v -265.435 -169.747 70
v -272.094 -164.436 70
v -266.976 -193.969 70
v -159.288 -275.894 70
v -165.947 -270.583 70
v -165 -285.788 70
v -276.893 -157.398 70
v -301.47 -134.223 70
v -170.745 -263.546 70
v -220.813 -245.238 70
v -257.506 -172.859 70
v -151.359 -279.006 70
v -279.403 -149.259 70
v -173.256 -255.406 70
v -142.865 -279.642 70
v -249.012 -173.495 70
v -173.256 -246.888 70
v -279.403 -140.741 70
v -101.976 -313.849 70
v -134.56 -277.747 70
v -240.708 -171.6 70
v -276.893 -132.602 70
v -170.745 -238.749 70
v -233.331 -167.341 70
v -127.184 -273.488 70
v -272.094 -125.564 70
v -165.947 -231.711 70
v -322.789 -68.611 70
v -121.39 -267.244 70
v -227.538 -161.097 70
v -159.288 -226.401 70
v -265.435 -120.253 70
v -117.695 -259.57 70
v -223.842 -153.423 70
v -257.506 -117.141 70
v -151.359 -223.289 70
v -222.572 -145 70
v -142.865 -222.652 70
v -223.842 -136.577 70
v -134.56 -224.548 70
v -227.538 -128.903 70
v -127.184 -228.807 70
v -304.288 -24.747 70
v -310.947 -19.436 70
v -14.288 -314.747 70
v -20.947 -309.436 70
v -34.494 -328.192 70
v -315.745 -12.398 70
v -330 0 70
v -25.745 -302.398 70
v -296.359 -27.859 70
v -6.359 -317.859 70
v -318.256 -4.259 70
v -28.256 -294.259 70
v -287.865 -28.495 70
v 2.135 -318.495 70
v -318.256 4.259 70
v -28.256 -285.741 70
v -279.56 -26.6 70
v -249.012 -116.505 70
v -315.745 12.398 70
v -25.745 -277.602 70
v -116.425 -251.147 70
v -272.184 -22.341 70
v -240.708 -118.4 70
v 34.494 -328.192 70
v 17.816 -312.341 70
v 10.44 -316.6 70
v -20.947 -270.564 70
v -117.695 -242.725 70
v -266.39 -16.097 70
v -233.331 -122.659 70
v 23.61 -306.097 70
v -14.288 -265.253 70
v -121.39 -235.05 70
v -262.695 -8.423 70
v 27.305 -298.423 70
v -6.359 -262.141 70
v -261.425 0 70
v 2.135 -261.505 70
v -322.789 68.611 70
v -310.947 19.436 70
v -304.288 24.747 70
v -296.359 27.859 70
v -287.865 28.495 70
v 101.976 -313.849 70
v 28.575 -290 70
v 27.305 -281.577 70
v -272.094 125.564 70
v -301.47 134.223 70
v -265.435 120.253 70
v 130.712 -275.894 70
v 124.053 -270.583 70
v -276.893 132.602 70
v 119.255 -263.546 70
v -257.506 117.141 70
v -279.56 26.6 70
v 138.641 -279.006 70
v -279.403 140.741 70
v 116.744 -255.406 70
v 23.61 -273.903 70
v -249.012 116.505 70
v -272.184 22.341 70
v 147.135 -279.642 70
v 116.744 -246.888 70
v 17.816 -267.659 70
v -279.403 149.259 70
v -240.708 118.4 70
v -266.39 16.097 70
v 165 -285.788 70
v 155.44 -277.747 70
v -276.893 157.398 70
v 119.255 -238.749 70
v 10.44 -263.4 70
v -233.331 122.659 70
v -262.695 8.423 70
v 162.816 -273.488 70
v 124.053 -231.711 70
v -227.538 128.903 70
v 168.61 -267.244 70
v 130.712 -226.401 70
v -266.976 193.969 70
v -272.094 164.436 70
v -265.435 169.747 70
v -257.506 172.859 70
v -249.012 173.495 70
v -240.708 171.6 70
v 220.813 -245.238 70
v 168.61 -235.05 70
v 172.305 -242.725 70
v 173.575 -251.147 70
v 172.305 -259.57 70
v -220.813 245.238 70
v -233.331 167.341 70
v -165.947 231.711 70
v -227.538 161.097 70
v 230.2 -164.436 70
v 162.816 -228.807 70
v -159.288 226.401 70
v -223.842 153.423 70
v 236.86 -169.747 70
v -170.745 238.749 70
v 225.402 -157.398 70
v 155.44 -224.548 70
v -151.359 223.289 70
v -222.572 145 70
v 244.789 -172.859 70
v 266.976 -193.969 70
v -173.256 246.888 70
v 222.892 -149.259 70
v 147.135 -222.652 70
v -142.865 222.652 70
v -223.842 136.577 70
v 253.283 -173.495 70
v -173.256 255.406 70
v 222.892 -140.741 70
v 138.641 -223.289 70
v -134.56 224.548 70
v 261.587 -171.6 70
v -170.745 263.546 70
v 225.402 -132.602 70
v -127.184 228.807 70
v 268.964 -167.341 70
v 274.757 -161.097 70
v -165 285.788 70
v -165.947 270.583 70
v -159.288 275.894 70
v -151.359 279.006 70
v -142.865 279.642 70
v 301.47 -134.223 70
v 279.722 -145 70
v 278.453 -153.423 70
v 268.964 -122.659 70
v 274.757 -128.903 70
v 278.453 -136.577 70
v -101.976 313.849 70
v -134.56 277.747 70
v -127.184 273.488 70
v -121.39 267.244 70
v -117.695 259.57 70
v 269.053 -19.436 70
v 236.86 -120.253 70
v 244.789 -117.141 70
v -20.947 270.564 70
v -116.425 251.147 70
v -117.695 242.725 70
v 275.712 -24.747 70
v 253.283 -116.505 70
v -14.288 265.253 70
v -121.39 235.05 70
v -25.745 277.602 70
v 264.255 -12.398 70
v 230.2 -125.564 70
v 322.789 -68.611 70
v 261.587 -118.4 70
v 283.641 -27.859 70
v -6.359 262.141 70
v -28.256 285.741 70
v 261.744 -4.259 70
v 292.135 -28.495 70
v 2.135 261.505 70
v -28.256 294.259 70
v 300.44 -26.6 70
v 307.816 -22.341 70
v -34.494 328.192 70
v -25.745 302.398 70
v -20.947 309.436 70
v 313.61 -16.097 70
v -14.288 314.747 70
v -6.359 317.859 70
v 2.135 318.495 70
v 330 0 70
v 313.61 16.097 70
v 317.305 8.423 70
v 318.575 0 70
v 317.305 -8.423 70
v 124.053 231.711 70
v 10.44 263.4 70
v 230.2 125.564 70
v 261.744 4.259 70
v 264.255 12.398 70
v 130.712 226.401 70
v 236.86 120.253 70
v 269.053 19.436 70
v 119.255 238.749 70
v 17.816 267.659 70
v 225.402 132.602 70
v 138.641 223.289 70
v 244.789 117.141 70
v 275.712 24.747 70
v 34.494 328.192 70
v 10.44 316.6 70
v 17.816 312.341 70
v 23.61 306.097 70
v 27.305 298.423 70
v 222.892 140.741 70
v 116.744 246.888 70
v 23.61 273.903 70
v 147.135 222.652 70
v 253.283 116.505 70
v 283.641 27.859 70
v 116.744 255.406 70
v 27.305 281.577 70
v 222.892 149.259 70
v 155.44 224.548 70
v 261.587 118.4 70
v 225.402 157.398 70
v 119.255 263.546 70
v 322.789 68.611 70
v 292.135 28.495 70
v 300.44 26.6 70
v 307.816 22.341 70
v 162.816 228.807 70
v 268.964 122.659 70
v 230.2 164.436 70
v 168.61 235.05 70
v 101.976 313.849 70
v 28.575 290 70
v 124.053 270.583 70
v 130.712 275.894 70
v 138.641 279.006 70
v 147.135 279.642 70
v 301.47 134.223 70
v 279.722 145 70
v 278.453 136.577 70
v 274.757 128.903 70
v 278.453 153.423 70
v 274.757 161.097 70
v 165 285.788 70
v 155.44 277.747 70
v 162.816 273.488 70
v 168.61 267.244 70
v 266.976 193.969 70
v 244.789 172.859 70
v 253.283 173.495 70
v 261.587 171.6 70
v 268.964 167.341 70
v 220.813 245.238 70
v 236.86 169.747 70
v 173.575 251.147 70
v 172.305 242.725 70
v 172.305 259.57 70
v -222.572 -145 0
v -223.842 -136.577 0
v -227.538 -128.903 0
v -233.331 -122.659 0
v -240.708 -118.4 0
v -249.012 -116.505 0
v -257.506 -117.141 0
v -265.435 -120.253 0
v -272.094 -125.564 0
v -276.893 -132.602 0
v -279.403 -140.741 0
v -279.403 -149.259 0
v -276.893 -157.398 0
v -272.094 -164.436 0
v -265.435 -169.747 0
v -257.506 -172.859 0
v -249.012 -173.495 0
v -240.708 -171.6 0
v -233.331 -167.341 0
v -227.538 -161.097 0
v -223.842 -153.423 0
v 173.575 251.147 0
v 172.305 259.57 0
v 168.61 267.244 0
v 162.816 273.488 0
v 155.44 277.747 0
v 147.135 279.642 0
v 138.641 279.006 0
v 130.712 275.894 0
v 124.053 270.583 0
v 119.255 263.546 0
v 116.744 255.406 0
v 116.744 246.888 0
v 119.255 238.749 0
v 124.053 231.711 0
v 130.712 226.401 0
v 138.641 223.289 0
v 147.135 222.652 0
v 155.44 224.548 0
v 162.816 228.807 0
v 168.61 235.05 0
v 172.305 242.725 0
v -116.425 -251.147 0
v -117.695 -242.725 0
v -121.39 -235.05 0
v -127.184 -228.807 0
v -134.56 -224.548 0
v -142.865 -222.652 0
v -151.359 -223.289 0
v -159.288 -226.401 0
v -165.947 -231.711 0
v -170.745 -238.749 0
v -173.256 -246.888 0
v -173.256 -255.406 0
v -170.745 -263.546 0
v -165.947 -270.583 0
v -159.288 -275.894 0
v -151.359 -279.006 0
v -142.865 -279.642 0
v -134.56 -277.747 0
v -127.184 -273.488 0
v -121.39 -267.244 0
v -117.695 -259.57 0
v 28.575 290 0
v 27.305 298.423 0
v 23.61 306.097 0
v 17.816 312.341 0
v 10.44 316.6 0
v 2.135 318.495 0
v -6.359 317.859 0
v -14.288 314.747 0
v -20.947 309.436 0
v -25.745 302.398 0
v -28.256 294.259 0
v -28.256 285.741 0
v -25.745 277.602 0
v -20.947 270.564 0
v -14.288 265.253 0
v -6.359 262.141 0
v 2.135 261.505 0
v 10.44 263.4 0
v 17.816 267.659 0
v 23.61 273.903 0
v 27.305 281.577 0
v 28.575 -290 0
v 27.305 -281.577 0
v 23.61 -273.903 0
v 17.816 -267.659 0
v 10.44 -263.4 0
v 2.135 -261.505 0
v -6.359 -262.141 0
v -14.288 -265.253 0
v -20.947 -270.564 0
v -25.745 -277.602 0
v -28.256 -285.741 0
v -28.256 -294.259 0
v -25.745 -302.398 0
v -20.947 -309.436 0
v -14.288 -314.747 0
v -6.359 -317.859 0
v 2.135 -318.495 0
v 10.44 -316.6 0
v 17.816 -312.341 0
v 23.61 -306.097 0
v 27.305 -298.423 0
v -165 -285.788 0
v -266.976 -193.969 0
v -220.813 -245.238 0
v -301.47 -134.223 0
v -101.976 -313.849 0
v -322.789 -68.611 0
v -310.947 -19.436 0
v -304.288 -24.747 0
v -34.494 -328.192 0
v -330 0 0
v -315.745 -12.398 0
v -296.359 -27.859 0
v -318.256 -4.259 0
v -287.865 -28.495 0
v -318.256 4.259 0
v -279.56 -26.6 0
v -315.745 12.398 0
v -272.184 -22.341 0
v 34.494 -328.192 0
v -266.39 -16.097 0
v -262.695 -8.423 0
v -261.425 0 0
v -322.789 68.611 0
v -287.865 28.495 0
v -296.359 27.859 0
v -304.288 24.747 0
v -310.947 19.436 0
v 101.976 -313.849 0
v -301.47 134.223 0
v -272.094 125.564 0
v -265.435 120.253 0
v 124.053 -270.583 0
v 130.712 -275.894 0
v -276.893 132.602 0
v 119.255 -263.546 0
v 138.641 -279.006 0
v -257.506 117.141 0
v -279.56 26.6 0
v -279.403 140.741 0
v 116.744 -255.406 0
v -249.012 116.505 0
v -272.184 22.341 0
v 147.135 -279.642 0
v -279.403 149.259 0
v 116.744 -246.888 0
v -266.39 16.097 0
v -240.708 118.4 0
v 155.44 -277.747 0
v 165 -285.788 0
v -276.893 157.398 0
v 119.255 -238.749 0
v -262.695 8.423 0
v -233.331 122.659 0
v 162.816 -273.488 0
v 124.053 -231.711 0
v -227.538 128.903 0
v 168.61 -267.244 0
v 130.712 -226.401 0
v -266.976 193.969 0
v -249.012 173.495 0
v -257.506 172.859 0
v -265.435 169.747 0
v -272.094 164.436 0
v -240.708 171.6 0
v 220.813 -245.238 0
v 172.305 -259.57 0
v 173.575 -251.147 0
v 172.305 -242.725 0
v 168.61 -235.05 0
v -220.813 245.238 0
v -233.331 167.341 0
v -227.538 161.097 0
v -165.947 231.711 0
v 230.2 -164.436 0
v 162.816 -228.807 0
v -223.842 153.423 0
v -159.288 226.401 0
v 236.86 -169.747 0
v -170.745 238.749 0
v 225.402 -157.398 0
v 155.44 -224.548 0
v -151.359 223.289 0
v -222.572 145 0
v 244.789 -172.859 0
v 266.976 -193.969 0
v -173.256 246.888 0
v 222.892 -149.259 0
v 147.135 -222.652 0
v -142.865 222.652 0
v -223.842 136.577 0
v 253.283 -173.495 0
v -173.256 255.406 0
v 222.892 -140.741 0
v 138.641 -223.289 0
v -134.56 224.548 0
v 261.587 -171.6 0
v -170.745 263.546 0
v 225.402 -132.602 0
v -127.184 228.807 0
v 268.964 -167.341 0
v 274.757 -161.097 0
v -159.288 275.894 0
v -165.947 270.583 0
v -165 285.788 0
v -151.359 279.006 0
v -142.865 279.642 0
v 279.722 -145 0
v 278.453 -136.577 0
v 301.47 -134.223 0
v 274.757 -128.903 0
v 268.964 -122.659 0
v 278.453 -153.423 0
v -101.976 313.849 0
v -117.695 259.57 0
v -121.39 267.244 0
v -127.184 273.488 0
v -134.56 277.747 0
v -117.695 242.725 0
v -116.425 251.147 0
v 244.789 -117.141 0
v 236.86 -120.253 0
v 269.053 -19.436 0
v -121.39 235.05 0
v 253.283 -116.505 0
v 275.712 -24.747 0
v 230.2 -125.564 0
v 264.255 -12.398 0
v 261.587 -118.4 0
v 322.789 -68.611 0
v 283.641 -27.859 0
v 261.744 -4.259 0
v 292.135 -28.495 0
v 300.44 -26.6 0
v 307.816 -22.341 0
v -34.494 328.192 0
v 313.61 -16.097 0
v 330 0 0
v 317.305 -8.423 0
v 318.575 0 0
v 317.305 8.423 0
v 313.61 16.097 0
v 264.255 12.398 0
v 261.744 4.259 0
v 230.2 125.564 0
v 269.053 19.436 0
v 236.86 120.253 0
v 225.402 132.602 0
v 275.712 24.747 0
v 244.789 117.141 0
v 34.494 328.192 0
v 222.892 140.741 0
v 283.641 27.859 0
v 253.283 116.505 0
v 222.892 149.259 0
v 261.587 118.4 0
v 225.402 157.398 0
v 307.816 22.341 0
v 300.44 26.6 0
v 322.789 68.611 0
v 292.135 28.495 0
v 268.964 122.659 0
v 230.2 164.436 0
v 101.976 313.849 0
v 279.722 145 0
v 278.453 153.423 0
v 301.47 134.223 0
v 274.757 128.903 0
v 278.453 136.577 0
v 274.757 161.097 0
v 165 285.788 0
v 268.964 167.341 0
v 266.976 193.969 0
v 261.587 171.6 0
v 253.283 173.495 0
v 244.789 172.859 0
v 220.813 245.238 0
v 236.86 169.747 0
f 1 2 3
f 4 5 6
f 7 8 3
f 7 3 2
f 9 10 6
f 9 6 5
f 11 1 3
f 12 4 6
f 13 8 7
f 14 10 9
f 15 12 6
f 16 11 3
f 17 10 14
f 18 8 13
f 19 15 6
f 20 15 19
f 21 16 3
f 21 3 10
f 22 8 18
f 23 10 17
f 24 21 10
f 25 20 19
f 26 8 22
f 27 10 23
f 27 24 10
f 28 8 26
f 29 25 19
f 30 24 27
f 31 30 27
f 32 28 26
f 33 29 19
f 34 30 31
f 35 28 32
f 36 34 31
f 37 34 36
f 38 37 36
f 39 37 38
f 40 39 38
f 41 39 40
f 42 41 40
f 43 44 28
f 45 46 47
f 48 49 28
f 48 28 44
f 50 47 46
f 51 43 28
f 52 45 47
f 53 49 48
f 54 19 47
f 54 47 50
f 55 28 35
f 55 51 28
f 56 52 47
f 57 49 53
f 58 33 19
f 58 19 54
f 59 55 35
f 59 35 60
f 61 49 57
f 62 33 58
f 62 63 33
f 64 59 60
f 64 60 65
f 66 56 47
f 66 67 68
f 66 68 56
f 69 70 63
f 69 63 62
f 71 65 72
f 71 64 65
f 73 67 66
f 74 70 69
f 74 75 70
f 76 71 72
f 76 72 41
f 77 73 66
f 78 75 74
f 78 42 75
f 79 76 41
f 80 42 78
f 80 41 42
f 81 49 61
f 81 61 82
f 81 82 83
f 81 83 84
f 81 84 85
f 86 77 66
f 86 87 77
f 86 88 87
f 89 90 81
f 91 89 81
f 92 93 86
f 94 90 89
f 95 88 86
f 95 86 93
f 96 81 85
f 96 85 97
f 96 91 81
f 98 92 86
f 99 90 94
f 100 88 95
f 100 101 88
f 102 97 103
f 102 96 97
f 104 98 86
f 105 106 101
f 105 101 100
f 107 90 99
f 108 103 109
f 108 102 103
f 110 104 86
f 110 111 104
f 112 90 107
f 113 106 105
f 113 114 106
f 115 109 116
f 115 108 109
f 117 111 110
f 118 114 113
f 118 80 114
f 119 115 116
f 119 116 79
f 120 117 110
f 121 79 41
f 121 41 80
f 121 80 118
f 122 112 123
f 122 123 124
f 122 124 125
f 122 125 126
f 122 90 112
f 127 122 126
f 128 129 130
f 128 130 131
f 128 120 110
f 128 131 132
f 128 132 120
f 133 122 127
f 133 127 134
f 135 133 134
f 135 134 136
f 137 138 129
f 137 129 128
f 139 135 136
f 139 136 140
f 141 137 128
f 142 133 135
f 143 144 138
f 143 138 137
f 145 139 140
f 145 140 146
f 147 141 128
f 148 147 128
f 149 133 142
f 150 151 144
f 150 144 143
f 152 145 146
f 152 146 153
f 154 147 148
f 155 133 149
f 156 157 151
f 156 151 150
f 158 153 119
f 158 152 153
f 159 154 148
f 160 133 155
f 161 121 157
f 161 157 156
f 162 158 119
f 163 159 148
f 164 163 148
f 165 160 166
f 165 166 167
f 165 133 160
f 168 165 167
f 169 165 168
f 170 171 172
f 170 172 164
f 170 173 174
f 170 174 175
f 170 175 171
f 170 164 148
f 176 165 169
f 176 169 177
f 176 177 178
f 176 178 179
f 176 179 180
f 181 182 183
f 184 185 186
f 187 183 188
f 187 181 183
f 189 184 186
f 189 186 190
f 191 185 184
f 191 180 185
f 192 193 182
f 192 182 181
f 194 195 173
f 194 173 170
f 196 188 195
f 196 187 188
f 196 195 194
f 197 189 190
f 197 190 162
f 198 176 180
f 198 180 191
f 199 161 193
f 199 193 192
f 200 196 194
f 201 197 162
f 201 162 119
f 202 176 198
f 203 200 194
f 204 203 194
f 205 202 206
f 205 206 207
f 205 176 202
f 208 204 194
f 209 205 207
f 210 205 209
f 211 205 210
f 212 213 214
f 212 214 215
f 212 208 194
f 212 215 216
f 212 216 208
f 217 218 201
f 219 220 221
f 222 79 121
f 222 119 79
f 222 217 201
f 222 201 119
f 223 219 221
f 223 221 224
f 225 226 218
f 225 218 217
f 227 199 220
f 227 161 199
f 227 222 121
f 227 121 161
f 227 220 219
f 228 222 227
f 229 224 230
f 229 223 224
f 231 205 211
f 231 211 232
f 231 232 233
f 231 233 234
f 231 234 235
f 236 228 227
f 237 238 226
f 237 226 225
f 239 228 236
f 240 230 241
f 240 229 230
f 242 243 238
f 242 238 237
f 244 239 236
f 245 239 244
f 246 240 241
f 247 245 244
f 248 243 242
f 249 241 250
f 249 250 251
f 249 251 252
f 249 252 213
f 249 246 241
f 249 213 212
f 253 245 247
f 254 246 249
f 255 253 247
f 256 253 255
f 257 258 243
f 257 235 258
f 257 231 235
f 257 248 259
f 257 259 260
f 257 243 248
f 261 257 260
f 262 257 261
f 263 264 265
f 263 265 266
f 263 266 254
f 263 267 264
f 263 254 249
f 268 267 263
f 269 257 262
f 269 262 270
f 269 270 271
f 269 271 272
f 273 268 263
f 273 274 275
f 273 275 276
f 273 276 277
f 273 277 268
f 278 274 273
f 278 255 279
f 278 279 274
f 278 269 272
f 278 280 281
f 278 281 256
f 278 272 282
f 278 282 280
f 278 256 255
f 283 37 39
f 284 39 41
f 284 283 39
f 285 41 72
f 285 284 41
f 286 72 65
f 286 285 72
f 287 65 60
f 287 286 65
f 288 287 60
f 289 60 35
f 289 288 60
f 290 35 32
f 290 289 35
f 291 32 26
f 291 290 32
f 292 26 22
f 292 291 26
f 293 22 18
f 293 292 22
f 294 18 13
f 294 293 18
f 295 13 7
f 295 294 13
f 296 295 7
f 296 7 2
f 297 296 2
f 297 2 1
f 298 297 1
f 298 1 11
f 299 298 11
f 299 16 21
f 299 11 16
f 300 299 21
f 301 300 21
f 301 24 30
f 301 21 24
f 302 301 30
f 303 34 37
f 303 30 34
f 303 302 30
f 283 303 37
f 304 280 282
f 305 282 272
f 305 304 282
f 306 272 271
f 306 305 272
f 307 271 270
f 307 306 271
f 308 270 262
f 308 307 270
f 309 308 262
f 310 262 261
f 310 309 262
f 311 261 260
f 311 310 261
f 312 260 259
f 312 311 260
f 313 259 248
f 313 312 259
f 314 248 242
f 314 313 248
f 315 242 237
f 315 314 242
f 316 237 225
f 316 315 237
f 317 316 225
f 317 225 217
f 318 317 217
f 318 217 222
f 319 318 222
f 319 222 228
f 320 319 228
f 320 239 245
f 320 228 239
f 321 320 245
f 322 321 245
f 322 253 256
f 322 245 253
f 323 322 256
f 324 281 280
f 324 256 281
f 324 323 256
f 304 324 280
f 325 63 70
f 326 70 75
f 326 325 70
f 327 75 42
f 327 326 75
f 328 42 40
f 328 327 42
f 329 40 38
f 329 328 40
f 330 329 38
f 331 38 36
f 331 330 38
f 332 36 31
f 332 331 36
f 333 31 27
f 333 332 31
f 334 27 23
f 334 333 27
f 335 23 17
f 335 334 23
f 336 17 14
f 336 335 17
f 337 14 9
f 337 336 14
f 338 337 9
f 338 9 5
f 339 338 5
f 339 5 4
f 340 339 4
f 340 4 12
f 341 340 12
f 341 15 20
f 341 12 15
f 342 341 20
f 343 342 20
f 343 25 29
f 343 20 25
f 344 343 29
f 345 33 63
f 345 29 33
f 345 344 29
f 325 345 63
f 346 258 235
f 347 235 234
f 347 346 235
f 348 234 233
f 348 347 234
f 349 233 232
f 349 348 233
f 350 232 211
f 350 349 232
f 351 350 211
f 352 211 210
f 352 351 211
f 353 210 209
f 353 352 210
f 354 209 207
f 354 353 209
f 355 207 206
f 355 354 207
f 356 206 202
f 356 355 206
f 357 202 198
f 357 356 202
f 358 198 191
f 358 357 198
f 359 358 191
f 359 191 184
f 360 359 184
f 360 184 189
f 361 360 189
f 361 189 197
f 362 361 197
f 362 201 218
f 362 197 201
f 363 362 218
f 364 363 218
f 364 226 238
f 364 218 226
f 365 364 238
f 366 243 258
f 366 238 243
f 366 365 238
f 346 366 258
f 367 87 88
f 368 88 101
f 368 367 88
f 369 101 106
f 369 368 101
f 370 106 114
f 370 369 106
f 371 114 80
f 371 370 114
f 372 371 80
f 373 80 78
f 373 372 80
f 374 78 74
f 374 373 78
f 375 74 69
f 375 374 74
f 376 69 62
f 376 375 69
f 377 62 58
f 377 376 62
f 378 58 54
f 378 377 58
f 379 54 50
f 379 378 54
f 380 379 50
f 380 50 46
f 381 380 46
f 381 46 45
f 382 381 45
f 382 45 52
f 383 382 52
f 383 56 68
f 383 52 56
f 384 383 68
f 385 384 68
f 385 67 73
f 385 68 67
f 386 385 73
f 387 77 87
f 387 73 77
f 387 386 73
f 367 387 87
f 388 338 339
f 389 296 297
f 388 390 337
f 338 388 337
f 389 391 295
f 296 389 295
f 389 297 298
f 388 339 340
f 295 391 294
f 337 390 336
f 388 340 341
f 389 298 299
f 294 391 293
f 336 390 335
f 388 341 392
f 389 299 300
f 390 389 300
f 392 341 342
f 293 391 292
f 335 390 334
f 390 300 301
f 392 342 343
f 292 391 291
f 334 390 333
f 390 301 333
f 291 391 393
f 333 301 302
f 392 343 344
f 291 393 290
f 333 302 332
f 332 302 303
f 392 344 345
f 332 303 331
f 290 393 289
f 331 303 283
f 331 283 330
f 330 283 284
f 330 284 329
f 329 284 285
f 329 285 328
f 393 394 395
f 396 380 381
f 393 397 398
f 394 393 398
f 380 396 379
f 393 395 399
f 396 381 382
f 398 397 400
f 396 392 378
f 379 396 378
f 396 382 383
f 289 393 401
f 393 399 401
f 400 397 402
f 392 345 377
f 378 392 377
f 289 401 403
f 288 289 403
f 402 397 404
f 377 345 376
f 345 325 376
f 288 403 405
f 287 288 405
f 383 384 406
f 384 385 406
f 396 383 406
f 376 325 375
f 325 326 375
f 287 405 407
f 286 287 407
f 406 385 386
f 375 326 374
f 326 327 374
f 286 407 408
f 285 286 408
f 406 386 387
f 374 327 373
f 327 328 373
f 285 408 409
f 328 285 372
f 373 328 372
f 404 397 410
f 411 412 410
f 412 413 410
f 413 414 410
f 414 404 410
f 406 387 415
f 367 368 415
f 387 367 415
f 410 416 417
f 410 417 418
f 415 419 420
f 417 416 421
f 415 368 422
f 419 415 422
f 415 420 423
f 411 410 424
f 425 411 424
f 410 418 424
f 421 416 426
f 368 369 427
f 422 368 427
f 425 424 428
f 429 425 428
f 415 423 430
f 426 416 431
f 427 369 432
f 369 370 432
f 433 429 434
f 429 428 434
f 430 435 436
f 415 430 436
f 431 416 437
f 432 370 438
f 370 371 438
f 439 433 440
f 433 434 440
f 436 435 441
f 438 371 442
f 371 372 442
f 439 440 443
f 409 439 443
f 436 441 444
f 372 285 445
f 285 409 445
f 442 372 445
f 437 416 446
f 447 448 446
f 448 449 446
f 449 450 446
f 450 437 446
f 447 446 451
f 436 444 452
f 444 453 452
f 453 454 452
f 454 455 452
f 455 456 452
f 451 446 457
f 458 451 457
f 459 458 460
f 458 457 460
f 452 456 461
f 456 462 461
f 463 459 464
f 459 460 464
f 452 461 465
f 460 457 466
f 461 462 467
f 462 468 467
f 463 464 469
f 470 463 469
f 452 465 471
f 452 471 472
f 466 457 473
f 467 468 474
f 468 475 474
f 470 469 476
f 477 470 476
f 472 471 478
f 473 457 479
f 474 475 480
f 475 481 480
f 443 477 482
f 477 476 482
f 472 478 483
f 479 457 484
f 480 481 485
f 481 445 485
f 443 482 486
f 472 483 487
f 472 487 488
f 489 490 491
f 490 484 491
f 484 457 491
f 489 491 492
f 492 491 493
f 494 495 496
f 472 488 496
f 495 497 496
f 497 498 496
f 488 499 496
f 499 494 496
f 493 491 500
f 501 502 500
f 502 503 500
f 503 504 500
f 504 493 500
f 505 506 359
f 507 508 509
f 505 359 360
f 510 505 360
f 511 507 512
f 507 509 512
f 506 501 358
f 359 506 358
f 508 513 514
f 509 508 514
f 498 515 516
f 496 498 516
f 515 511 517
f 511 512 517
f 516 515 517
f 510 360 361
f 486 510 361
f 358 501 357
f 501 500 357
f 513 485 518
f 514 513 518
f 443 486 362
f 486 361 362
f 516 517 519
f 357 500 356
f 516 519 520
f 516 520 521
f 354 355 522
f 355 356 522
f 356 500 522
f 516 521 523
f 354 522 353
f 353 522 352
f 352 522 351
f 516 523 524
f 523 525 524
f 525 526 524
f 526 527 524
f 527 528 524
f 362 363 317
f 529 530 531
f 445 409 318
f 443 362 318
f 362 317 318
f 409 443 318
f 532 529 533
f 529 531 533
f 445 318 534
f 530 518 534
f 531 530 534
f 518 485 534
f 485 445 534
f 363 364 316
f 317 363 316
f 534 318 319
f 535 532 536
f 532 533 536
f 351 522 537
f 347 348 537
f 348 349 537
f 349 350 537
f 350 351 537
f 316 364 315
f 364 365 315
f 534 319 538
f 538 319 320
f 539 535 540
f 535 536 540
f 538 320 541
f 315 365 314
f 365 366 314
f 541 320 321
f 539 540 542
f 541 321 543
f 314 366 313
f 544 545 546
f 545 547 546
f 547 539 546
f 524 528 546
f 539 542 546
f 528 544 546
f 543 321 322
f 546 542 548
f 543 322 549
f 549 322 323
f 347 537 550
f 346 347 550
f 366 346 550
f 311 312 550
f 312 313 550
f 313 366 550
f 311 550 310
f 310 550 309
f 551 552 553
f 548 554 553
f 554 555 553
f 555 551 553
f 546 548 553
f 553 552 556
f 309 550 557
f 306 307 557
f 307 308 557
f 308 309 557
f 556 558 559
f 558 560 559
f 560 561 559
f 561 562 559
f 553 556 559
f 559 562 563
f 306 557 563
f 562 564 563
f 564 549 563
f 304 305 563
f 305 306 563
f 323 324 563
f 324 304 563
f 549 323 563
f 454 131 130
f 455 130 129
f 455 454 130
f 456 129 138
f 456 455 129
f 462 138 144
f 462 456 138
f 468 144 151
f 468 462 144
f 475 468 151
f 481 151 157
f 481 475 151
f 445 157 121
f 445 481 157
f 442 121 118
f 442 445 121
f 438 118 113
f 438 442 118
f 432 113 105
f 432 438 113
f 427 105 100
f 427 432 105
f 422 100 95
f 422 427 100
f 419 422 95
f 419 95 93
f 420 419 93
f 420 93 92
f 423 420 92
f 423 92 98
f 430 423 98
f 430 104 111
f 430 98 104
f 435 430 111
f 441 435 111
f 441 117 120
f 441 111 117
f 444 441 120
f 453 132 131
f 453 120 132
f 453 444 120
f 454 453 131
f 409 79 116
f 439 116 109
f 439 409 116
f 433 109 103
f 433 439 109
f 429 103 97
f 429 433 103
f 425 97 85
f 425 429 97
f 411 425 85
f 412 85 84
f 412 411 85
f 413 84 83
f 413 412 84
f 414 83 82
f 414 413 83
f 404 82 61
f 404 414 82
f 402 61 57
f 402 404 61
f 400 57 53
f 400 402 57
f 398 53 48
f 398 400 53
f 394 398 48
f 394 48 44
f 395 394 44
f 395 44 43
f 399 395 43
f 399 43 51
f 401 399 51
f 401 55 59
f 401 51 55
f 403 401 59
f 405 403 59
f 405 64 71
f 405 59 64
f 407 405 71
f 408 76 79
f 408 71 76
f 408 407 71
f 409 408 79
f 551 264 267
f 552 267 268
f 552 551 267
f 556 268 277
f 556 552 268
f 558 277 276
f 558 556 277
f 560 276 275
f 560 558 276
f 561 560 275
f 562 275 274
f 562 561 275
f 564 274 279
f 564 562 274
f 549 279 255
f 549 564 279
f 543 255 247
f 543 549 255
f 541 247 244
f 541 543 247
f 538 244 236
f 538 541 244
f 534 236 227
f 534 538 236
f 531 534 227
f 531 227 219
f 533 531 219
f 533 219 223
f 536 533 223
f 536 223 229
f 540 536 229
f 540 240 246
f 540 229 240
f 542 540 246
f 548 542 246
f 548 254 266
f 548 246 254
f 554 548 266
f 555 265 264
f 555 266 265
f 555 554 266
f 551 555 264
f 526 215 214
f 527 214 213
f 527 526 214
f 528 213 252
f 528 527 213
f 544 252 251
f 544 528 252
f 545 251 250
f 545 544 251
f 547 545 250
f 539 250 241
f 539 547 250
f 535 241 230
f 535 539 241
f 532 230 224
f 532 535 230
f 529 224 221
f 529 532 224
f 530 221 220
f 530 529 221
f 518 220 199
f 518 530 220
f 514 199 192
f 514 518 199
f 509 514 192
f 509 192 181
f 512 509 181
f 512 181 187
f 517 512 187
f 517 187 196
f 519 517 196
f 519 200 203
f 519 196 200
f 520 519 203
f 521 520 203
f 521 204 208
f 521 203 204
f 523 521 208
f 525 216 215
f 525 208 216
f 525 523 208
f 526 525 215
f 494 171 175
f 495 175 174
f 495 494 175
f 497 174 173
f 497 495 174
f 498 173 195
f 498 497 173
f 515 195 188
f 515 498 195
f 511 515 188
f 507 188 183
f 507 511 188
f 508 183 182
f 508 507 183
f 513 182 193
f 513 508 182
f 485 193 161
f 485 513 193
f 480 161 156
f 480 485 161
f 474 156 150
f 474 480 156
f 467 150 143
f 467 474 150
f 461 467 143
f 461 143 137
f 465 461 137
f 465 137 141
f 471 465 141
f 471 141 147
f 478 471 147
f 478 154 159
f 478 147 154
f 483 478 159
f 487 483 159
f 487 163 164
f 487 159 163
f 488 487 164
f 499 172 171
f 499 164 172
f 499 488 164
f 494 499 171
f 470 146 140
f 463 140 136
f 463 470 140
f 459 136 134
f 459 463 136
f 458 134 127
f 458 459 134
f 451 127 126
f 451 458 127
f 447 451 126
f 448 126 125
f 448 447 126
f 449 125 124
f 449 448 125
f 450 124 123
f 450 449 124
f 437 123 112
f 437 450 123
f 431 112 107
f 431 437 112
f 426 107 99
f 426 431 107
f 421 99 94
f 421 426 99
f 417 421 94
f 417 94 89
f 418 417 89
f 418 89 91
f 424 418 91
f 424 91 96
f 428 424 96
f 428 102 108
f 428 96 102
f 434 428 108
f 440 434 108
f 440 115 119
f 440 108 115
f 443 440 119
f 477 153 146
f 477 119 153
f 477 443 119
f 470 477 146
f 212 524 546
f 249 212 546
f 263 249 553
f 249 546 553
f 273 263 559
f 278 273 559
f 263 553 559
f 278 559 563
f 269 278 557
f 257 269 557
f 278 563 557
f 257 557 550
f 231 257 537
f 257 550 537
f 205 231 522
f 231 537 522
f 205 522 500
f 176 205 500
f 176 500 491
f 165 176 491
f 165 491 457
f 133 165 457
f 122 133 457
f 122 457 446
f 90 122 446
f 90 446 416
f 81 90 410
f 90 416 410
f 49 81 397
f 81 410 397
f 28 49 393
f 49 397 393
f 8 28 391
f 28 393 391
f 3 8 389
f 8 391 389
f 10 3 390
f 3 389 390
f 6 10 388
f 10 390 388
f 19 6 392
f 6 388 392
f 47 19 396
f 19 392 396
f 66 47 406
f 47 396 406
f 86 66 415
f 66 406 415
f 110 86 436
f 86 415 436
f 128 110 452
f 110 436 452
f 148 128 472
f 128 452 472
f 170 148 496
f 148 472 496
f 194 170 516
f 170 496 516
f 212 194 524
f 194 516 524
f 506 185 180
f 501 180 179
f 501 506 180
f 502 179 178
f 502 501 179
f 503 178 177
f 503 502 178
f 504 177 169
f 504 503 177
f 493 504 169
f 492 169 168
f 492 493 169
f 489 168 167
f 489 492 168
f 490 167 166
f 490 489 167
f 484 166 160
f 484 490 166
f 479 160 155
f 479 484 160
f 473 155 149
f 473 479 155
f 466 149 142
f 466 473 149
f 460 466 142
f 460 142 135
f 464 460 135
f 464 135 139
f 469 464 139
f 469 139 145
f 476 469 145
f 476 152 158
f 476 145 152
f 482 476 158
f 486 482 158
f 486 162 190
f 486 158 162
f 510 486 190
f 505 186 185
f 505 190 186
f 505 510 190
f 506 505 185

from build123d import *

# Parameters (mm, degrees)
SKETCH1_R           = 330
SKETCH1_R_2         = 247.5
BOSS_EXTRUDE1_DEPTH = 70
SKETCH2_R           = 28.575
CUT_EXTRUDE1_DEPTH  = 131


with BuildPart() as part:
    # Sketch1 → Boss-Extrude1 (new body)
    with BuildSketch(Plane.XY):
        Circle(SKETCH1_R)
        Circle(SKETCH1_R_2, mode=Mode.SUBTRACT)
        Circle(SKETCH1_R_2)
    extrude(amount=BOSS_EXTRUDE1_DEPTH)

    # Sketch2 → Cut-Extrude1 (cut)
    with BuildSketch(Plane.XY):
        with Locations((0, 290)):
            Circle(SKETCH2_R)
        with Locations((145, 251.147367097)):
            Circle(SKETCH2_R)
        with Locations((251.147367097, 145)):
            Circle(SKETCH2_R)
        with Locations((290, 0)):
            Circle(SKETCH2_R)
        with Locations((251.147367098, -145)):
            Circle(SKETCH2_R)
        with Locations((145, -251.147367097)):
            Circle(SKETCH2_R)
        with Locations((0, -290)):
            Circle(SKETCH2_R)
        with Locations((-145, -251.147367097)):
            Circle(SKETCH2_R)
        with Locations((-251.147367097, -145)):
            Circle(SKETCH2_R)
        with Locations((-290, 0)):
            Circle(SKETCH2_R)
        with Locations((-251.147367097, 145)):
            Circle(SKETCH2_R)
        with Locations((-145, 251.147367097)):
            Circle(SKETCH2_R)
    extrude(amount=CUT_EXTRUDE1_DEPTH, mode=Mode.SUBTRACT)


solid = part.part
